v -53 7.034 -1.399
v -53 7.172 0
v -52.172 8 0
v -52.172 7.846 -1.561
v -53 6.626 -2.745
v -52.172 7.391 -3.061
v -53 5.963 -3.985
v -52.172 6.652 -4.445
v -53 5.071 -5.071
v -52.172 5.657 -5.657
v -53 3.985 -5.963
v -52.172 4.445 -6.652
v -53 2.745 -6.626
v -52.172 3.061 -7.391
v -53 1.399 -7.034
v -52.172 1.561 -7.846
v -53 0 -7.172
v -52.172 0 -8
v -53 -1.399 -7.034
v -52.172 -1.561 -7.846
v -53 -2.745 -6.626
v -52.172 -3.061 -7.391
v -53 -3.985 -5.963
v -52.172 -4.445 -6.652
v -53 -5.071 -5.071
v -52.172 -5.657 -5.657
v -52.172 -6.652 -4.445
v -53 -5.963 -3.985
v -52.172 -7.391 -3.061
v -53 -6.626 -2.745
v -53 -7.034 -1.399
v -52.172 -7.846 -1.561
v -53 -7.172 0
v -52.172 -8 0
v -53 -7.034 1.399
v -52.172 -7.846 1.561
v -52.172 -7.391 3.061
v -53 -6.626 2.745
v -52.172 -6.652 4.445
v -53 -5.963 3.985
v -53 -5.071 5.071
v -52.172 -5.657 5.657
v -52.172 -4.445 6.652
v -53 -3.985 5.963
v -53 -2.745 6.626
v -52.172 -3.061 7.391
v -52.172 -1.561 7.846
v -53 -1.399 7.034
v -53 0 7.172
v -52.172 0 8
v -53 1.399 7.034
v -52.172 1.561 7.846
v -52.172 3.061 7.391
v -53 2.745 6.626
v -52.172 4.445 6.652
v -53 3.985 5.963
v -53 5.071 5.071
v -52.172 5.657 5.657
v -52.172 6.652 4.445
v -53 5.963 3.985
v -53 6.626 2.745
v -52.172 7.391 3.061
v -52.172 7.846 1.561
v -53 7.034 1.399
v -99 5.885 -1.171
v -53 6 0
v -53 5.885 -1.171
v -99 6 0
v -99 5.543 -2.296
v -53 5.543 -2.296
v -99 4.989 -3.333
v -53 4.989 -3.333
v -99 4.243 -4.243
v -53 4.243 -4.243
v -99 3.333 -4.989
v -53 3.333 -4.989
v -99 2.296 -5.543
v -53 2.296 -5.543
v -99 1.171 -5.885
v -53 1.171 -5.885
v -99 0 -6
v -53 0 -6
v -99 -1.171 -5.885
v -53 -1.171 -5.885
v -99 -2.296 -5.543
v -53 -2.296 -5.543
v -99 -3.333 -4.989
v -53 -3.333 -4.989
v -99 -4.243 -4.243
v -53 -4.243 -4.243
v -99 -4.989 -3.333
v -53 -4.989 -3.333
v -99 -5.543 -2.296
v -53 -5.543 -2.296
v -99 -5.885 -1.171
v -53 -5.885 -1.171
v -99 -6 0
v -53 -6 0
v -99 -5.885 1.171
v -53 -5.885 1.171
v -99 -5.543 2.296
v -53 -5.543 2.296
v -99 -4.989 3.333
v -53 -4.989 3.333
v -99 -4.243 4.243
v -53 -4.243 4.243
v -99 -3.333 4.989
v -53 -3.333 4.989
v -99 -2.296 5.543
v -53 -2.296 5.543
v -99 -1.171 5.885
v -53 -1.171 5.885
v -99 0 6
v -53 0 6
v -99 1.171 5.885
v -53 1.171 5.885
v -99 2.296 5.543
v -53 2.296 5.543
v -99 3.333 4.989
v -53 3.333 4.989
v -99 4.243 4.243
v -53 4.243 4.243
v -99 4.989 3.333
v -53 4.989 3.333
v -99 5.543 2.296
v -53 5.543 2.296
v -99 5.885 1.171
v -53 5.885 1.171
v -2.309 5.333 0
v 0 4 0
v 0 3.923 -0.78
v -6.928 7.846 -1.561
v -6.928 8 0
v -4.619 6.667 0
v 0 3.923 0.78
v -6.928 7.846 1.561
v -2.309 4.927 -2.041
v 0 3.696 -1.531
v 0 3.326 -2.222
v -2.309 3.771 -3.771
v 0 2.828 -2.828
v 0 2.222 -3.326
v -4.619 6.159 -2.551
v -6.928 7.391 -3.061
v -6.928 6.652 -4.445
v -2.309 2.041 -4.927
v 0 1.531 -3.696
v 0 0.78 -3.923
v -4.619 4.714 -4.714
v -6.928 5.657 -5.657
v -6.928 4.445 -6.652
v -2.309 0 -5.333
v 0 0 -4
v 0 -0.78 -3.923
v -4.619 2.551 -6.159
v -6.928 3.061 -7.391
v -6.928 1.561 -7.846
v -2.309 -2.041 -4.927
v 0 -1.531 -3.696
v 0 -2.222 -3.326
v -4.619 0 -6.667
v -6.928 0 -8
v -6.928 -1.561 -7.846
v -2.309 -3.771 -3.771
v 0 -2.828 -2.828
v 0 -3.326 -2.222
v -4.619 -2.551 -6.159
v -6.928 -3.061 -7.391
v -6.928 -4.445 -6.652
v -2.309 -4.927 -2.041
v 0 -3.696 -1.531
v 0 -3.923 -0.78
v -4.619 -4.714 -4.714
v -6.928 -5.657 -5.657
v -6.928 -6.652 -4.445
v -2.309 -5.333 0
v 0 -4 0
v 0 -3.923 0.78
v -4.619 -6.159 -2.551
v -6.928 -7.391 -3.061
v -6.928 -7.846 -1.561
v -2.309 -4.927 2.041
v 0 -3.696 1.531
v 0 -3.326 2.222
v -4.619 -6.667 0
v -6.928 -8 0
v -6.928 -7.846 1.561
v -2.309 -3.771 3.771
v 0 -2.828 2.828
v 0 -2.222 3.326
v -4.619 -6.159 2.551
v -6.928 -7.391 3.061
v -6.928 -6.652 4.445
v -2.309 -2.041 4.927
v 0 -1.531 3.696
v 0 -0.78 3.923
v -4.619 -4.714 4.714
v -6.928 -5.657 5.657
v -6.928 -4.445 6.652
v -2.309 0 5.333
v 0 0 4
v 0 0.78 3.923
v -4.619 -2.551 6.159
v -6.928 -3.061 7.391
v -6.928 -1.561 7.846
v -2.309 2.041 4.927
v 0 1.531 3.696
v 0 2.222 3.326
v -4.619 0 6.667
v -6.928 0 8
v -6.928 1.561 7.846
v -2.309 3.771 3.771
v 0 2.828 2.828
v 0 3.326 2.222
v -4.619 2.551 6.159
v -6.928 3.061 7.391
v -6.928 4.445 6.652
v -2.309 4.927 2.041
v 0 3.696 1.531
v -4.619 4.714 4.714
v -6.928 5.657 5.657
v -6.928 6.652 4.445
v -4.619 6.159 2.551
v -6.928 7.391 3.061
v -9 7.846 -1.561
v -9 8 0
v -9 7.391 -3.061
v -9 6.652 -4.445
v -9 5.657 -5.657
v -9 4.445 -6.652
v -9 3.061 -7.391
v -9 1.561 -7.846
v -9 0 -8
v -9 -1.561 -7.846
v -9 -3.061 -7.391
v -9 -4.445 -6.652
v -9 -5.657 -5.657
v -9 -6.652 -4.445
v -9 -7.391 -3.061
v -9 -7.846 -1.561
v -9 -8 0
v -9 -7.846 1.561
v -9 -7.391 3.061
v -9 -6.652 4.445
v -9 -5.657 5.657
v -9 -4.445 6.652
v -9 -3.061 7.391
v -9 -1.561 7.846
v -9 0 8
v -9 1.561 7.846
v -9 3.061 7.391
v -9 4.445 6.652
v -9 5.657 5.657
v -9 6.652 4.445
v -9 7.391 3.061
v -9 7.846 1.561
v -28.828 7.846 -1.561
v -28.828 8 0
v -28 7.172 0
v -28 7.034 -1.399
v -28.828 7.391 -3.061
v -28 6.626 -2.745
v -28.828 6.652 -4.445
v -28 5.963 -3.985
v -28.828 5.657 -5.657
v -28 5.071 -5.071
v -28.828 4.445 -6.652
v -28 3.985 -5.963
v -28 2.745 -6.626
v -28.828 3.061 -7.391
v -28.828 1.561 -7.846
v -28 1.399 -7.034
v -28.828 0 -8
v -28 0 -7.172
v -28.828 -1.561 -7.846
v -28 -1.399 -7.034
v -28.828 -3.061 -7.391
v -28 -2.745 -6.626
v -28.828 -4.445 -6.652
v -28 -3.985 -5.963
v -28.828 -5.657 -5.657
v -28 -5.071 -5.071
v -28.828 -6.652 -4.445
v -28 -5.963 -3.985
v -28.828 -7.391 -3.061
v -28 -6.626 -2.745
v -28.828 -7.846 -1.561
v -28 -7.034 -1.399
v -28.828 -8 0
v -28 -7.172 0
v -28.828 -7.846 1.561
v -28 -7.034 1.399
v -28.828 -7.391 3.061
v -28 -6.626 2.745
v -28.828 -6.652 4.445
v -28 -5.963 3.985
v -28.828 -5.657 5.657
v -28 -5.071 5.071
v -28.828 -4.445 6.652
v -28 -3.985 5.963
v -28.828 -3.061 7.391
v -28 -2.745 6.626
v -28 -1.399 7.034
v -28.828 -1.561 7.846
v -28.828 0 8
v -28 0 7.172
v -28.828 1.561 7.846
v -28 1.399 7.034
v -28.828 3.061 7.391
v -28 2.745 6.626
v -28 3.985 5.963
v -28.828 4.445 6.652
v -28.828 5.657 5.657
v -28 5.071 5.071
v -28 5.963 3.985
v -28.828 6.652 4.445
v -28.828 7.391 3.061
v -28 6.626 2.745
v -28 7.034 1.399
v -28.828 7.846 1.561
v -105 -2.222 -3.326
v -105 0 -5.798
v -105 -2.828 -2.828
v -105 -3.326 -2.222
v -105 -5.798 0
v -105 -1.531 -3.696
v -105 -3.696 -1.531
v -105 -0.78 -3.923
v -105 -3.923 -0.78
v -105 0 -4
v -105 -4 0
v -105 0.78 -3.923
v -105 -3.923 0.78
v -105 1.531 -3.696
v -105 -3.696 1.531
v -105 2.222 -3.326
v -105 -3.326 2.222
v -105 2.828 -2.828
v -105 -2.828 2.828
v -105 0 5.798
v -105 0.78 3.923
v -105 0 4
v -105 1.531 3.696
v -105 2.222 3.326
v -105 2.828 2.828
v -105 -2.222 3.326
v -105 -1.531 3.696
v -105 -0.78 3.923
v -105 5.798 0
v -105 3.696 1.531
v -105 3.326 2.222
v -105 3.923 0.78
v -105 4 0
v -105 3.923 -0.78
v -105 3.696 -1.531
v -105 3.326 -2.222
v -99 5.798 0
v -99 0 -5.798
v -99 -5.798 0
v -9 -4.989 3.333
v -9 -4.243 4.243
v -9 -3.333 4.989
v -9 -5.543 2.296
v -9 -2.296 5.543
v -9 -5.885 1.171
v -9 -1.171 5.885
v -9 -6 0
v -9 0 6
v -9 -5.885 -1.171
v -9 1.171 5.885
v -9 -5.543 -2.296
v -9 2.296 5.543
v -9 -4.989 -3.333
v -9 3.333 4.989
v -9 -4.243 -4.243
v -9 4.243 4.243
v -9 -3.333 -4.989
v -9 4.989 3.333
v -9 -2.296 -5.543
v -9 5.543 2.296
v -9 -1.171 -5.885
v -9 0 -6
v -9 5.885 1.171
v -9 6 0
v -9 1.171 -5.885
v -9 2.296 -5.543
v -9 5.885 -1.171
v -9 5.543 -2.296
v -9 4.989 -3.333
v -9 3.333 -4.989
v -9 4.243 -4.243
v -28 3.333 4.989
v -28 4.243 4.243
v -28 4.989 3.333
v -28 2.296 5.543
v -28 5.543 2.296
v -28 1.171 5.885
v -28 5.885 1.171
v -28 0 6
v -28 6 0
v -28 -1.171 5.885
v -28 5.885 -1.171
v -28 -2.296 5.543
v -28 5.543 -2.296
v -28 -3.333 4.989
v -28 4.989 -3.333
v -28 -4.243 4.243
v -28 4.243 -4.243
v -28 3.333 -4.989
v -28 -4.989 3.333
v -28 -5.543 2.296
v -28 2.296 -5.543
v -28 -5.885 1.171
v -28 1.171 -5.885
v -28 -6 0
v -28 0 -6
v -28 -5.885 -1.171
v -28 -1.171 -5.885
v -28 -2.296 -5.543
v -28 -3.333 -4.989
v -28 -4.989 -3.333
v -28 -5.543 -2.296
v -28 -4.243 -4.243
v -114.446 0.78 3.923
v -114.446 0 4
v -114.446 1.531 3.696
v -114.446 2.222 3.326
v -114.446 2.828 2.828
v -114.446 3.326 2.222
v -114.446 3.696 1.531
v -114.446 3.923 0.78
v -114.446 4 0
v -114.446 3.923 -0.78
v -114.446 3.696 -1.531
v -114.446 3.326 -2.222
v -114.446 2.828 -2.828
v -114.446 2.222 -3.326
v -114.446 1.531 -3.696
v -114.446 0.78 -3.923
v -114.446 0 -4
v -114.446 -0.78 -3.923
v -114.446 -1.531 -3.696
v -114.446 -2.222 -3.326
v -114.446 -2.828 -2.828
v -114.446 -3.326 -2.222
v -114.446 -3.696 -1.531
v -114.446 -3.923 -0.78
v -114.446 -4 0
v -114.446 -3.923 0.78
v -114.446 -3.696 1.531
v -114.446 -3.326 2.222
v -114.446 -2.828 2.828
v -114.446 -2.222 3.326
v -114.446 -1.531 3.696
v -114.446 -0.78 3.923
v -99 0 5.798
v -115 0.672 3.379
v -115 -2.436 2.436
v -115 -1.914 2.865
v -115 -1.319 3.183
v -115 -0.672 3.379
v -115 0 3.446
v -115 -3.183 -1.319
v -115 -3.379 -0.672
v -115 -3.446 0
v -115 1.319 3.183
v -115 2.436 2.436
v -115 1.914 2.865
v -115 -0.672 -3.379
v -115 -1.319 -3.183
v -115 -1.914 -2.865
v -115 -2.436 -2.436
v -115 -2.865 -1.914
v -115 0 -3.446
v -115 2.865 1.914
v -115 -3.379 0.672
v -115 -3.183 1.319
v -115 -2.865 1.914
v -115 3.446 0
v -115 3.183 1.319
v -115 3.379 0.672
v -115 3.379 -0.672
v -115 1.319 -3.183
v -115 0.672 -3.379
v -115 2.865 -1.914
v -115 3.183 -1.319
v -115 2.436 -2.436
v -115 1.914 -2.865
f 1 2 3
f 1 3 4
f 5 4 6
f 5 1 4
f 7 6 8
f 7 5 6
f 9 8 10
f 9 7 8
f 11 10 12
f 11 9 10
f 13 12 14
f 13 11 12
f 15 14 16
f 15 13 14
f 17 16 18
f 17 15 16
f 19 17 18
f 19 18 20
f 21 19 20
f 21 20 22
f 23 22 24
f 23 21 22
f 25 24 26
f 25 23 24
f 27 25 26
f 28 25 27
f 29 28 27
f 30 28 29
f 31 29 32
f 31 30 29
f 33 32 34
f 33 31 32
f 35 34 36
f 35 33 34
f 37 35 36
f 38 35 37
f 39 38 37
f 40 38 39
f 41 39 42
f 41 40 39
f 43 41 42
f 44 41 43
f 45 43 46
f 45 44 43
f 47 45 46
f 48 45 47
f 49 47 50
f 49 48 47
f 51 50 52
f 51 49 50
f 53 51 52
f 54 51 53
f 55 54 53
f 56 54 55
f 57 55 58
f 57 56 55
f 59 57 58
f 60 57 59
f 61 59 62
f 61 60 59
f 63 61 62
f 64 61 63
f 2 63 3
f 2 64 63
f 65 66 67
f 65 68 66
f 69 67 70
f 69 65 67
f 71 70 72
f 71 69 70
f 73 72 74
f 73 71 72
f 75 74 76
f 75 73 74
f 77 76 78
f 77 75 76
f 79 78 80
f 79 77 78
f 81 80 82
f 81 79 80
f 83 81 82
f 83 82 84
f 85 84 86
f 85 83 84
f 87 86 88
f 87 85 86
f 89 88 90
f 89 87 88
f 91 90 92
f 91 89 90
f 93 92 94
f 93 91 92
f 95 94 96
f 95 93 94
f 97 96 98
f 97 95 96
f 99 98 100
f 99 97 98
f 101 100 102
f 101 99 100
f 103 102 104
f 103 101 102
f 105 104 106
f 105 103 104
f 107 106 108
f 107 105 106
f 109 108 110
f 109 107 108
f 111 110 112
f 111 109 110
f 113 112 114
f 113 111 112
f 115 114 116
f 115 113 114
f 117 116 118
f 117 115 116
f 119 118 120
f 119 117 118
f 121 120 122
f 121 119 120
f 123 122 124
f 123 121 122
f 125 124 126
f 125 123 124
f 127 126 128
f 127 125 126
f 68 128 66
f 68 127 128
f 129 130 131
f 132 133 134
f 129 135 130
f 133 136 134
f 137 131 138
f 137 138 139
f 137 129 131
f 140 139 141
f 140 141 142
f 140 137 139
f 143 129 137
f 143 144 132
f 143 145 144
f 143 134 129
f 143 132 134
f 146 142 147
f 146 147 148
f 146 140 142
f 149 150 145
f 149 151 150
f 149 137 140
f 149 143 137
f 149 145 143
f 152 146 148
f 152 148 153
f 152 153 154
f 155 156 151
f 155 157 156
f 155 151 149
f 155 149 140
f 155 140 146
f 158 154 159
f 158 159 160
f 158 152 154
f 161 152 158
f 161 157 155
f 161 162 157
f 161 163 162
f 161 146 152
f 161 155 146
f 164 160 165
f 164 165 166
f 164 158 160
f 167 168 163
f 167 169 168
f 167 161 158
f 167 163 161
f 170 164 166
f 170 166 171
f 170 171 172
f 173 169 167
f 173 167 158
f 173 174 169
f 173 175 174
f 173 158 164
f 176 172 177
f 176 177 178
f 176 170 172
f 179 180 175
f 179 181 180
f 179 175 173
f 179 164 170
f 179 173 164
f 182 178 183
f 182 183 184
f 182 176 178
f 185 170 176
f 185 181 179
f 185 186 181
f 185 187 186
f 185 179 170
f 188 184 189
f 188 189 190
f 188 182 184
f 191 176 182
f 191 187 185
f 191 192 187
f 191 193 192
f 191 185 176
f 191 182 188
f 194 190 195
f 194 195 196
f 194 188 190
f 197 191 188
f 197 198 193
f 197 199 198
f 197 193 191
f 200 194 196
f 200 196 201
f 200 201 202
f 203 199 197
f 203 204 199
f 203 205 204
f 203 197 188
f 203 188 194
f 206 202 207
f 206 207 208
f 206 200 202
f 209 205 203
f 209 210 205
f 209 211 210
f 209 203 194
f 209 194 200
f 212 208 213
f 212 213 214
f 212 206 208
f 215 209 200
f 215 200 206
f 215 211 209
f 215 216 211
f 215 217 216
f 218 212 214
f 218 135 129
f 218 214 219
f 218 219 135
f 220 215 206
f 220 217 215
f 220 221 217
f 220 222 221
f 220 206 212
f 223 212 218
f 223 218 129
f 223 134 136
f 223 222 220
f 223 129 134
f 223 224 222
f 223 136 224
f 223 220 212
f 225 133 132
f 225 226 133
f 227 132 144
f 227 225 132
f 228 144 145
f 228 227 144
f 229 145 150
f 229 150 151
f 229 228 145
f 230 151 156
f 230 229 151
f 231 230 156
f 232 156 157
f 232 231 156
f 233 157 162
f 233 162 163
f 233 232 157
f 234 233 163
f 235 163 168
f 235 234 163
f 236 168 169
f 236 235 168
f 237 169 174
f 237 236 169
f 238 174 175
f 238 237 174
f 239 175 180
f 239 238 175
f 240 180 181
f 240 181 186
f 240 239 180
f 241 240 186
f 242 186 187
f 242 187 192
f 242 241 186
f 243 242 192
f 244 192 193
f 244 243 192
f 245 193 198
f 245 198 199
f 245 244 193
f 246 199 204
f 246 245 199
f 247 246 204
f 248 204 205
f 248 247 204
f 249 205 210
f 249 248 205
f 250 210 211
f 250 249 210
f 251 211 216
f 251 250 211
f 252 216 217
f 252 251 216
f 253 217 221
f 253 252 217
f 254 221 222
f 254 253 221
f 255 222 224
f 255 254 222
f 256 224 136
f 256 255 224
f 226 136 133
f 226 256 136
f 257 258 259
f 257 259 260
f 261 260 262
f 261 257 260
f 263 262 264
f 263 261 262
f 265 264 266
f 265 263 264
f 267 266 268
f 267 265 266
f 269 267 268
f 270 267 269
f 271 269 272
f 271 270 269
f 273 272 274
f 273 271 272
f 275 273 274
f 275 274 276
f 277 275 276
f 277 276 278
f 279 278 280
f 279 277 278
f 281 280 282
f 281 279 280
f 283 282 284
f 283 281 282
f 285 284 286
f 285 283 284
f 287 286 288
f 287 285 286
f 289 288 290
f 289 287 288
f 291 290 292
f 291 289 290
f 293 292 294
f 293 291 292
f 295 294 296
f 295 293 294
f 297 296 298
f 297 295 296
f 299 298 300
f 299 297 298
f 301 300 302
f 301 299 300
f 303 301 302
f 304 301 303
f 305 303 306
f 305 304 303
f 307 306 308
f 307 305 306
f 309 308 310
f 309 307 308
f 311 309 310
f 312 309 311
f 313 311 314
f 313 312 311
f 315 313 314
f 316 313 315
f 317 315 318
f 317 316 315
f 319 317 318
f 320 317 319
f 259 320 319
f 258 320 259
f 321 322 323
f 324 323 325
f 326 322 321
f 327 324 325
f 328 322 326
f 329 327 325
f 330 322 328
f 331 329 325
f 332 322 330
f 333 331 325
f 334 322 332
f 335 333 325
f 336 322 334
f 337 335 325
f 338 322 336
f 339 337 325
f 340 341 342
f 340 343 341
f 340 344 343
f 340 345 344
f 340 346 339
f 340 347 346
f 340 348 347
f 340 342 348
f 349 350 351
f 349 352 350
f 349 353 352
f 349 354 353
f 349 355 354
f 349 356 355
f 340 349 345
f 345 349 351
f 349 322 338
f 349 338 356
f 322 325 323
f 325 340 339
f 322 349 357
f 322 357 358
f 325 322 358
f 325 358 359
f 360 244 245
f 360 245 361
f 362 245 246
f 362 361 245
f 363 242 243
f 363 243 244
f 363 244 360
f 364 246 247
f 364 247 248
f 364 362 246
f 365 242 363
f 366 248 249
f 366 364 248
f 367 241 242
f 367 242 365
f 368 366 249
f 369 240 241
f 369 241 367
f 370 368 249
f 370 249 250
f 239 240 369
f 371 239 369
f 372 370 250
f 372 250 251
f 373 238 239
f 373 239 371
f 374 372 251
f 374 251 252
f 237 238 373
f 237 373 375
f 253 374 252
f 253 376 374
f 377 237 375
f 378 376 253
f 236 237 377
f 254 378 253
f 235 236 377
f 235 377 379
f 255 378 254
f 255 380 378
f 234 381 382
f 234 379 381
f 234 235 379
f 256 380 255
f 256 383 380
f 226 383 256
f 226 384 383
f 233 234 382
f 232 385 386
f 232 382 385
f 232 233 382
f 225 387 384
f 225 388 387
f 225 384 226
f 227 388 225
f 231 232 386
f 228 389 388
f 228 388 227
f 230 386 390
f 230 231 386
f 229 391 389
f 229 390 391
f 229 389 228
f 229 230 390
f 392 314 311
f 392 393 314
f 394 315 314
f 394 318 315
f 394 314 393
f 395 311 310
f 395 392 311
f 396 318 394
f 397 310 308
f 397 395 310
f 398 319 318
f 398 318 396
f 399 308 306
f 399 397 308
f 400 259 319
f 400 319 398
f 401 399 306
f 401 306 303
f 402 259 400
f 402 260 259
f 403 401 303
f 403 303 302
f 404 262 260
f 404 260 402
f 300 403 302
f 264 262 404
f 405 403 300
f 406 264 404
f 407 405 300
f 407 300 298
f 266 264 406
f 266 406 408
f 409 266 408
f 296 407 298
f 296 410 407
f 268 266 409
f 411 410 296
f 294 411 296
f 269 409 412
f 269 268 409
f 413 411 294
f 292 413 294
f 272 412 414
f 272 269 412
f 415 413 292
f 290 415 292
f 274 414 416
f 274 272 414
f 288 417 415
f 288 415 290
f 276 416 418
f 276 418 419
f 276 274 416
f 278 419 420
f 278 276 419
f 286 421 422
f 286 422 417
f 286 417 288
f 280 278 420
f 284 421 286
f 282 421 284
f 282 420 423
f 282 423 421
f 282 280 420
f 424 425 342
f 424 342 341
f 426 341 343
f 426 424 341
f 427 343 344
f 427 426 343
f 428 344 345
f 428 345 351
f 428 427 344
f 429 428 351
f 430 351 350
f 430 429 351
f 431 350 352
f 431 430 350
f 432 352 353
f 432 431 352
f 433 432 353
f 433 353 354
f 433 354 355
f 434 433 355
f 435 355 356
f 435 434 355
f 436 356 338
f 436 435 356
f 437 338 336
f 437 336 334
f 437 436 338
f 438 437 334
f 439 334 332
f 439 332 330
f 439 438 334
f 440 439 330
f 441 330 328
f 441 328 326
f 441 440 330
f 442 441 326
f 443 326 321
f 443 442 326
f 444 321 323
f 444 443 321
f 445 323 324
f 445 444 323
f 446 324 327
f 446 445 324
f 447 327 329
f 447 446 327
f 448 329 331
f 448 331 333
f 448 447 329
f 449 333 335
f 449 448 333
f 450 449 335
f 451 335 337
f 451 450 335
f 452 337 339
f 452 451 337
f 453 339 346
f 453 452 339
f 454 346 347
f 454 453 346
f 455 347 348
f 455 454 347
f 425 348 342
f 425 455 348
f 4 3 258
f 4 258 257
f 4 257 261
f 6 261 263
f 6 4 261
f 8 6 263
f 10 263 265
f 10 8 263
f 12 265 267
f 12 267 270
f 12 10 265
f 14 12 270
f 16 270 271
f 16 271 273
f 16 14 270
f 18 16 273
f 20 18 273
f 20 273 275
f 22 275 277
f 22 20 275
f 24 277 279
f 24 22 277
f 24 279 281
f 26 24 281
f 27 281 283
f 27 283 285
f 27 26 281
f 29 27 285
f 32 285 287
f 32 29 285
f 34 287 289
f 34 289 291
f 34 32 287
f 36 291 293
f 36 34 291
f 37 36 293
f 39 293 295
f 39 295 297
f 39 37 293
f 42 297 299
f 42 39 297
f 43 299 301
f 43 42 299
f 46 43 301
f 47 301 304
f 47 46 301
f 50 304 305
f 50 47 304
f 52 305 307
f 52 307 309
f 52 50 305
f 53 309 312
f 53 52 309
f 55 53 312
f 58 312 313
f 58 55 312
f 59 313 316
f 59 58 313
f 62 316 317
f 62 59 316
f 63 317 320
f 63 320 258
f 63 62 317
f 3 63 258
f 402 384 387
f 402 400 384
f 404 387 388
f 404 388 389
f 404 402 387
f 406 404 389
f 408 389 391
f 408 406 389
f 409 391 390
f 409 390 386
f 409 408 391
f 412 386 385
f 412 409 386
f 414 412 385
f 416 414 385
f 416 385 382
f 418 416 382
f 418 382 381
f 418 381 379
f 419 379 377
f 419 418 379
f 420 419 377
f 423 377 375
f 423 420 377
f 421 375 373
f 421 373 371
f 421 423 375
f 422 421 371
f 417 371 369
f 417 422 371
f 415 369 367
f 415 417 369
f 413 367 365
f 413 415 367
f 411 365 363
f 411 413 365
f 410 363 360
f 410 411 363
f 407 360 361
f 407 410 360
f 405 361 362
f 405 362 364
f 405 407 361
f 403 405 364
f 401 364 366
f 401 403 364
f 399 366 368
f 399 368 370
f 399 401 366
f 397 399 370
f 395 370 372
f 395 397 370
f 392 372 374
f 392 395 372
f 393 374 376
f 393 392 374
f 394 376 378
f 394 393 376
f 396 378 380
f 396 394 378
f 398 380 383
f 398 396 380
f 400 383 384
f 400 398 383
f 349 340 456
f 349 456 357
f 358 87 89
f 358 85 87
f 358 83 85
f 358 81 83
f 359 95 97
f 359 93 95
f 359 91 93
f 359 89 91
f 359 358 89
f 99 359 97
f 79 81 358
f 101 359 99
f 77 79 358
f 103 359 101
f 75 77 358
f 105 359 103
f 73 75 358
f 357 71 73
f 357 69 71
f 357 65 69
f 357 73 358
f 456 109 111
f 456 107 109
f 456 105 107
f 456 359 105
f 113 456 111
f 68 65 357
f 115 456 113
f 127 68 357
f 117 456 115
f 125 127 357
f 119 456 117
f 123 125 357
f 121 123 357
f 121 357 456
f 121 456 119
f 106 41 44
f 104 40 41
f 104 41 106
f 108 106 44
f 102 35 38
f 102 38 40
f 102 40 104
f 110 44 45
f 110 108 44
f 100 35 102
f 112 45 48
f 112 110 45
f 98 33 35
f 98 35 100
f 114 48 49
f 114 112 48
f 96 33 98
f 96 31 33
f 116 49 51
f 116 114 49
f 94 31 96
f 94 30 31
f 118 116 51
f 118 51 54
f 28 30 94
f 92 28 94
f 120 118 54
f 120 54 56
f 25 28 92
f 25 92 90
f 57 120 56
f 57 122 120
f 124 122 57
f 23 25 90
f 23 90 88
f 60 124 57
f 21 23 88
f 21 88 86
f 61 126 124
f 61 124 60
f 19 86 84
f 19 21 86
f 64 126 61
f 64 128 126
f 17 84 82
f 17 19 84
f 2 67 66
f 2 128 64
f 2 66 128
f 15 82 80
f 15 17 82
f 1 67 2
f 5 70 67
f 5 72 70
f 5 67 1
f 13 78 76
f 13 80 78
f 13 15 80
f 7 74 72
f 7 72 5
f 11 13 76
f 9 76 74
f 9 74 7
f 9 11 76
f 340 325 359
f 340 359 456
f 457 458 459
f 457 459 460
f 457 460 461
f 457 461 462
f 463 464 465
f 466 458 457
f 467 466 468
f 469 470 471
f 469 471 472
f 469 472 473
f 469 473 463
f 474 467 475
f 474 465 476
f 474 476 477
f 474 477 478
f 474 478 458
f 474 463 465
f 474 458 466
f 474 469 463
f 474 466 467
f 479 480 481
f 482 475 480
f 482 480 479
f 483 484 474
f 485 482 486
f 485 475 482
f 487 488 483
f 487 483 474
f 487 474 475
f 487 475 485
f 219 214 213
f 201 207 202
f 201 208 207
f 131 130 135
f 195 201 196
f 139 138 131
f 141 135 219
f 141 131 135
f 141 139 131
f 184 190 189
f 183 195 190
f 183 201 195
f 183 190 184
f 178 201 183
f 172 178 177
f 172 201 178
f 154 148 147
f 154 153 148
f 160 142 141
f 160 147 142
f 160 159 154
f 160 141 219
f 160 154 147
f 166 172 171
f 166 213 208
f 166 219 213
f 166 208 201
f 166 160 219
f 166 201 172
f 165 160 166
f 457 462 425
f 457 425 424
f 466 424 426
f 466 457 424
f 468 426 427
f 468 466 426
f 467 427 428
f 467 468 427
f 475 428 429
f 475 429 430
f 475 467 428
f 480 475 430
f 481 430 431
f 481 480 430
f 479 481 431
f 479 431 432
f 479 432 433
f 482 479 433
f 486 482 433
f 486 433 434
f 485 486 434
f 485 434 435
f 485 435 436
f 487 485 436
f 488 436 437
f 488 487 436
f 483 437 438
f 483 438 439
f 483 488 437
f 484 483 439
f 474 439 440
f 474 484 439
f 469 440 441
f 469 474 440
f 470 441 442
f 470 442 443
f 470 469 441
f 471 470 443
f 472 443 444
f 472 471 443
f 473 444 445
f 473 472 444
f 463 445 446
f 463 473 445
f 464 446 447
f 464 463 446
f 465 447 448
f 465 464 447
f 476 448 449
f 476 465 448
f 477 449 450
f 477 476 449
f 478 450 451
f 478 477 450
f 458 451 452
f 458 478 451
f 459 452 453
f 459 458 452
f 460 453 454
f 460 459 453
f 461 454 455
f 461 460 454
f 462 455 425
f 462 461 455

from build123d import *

# Parameters (mm, degrees)
CHAMFER_1_SIZE      = 0.828
SKETCH_2_R          = 6
SKETCH_2_R_2        = 4
CUT_EXTRUDE_1_DEPTH = 10
SKETCH_3_R          = 6
CUT_EXTRUDE_2_DEPTH = 6
CHAMFER_2_SIZE      = 0.5545


with BuildPart() as part:
    # Эскиз1 → Повернуть1 (revolve)
    with BuildSketch(Plane.XY):
        Polygon((0, 0), (0, 4), (-6.92820323, 8), (-9, 8), (-9, 6), (-28, 6), (-28, 8), (-53, 8), (-53, 6), (-115, 6), (-115, 0), align=None)
    revolve(axis=Axis((0, 0, 0), (-1, 0, 0)))

    # Фаска1
    chamfer_1_edges = [part.edges().sort_by_distance(p)[0] for p in [
        (-53, -8, 0),
        (-28, -8, 0),
    ]]
    chamfer(chamfer_1_edges, length=CHAMFER_1_SIZE)

    # Эскиз2 → Вырез-Вытянуть1 (cut)
    with BuildSketch(Plane.ZY.offset(115)):
        Circle(SKETCH_2_R)
        Circle(SKETCH_2_R_2, mode=Mode.SUBTRACT)
    extrude(amount=-CUT_EXTRUDE_1_DEPTH, mode=Mode.SUBTRACT)

    # Эскиз3 → Вырез-Вытянуть2 (cut)
    with BuildSketch(Plane.ZY.offset(105)):
        Circle(SKETCH_3_R)
        Polygon((0, 5.798275606), (-5.798275606, 0), (0, -5.798275606), (5.798275606, 0), align=None, mode=Mode.SUBTRACT)
    extrude(amount=-CUT_EXTRUDE_2_DEPTH, mode=Mode.SUBTRACT)

    # Фаска2
    chamfer_2_edges = [part.edges().sort_by_distance(p)[0] for p in [
        (-115, 0, -4),
    ]]
    chamfer(chamfer_2_edges, length=CHAMFER_2_SIZE)


solid = part.part
